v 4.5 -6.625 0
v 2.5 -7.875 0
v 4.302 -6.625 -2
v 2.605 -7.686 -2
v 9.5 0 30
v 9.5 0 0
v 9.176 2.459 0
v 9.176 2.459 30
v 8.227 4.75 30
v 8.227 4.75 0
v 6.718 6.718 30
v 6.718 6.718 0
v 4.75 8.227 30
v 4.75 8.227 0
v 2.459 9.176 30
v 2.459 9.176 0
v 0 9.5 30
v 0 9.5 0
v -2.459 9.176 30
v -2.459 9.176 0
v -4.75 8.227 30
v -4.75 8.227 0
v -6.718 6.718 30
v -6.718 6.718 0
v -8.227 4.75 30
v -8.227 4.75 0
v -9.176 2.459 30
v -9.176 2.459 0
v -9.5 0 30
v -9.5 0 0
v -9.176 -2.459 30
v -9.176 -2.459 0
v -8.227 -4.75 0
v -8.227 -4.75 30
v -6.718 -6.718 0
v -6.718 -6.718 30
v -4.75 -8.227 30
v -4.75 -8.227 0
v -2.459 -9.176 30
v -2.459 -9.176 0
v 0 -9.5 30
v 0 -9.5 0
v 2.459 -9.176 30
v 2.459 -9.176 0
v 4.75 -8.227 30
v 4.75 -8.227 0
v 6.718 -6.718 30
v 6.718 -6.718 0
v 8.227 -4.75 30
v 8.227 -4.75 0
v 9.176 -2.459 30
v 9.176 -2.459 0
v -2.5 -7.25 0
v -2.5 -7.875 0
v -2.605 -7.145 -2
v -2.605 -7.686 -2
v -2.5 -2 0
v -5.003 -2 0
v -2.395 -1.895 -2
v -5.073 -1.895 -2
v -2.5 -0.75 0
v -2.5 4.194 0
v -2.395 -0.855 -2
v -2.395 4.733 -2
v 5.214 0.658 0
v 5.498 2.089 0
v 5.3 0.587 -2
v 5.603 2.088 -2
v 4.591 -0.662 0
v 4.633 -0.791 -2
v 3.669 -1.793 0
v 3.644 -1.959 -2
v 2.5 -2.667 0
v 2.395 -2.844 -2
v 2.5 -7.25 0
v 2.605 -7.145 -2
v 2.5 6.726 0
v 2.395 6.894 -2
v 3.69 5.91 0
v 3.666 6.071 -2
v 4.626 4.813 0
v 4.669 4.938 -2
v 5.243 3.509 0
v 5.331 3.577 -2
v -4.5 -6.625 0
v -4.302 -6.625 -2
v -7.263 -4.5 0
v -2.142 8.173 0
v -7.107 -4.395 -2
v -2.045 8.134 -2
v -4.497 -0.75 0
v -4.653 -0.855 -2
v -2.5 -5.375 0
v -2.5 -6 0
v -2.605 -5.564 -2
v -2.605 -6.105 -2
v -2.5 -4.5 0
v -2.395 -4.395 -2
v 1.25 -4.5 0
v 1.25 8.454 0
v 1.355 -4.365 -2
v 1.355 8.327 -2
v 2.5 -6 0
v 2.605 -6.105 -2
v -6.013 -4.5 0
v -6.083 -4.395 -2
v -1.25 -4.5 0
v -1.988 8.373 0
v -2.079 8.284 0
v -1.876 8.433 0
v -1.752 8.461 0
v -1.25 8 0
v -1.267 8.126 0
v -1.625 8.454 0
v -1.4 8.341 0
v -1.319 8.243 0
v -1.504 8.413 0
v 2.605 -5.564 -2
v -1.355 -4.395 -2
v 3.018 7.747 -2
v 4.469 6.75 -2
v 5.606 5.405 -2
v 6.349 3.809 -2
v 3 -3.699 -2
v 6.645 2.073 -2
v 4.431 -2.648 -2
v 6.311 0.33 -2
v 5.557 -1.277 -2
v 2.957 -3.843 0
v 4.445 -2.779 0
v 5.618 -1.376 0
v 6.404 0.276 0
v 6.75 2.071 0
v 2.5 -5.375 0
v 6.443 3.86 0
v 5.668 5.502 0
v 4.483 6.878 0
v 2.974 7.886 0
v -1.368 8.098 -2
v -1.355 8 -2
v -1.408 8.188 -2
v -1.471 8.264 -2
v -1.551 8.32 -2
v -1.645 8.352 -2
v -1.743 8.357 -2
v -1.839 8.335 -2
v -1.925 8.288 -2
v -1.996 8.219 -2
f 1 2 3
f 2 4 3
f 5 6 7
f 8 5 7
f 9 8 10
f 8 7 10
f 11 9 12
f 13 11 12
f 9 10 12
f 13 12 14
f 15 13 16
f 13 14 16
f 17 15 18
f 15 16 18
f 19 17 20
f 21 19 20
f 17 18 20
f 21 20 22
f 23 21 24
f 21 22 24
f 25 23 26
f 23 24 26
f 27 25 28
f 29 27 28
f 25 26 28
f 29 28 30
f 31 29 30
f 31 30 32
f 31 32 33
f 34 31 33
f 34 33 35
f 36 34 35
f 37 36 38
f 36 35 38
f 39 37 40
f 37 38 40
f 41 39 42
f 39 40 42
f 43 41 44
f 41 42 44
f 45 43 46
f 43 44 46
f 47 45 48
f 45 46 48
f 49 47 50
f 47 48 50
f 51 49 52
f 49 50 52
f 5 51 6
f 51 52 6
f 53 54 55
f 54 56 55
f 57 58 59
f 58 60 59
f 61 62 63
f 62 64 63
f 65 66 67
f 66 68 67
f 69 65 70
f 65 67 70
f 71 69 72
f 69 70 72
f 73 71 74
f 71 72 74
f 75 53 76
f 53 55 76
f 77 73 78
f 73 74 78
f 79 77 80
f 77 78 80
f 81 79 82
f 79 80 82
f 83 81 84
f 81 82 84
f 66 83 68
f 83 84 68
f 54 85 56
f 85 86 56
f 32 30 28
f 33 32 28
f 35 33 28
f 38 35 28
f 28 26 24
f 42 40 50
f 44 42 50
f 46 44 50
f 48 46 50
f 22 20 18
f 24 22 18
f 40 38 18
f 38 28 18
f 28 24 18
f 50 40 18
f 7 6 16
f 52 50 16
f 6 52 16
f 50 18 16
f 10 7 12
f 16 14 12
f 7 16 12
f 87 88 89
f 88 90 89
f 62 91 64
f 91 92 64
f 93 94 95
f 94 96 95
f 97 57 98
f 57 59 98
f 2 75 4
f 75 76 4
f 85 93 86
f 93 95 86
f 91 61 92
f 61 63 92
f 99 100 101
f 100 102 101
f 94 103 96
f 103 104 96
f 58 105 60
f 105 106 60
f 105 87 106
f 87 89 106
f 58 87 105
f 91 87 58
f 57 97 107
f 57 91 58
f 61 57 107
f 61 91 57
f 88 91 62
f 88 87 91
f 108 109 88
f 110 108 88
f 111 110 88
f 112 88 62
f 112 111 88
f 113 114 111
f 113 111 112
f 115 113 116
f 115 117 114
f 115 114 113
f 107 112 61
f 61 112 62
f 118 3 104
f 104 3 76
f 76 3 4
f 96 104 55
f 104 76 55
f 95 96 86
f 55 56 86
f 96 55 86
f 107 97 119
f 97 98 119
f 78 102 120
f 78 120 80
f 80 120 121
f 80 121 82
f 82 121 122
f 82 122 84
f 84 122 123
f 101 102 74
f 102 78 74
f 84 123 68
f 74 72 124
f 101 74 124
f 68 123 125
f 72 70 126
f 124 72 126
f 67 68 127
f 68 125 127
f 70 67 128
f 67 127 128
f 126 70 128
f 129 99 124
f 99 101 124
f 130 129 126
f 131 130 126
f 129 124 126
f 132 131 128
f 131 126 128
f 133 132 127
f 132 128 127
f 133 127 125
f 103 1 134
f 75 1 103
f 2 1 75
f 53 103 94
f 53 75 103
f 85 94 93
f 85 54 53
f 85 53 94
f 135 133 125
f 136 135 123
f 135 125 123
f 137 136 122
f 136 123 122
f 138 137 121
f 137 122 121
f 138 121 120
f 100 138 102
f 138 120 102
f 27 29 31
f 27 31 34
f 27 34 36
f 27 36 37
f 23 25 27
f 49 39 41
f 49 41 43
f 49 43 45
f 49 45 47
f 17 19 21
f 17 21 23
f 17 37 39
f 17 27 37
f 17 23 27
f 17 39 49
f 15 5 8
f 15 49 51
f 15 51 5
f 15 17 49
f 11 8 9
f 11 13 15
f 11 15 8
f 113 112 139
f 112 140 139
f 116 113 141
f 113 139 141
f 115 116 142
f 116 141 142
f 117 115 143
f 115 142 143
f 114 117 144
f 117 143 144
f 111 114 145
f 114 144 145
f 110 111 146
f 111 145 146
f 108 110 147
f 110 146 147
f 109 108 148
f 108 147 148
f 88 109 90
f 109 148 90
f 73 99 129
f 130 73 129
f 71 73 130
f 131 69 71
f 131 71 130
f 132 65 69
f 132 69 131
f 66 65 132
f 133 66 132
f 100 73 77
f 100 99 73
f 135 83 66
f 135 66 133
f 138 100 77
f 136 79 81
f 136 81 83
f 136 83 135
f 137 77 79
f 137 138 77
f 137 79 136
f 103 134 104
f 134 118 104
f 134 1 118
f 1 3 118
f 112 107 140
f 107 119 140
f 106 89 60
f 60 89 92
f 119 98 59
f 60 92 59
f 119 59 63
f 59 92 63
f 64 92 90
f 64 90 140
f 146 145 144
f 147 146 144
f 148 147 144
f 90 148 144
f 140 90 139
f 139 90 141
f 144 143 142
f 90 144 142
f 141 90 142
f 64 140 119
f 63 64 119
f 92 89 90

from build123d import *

# Parameters (mm, degrees)
F1_DEPTH = 2
F1_TAPER = 3
F0_R     = 9.5
F2_DEPTH = 30


with BuildPart() as f1:
    # F0 (on Top) → F1 (new body)
    with BuildSketch(Plane.XY):
        with BuildLine():
            Line((-2.5, -4.5), (-1.25, -4.5))
            Line((-1.25, -4.5), (-1.25, 8))
            ThreePointArc((-1.25, 8), (-1.6246096615, 8.4544378581), (-2.1421771094, 8.1734216623))
            Line((-2.1421771094, 8.1734216623), (-7.2625718321, -4.5))
            Line((-7.2625718321, -4.5), (-6.0125718321, -4.5))
            Line((-6.0125718321, -4.5), (-5.0025062675, -2))
            Line((-5.0025062675, -2), (-2.5, -2))
            Line((-2.5, -2), (-2.5, -4.5))
        make_face()
        Polygon((-2.5, -0.75), (-4.4974734852, -0.75), (-2.5, 4.1939203632), align=None, mode=Mode.SUBTRACT)
    extrude(amount=-F1_DEPTH, taper=F1_TAPER)


with BuildPart() as f1b:
    # F0 (on Top) → F1, piece 2 (new body)
    with BuildSketch(Plane.XY):
        with BuildLine():
            Line((1.25, 8.4544378581), (1.25, -4.5))
            ThreePointArc((1.25, -4.5), (5.075982109, -2.1148576985), (6.75, 2.0713944437))
            ThreePointArc((6.75, 2.0713944437), (5.1224940234, 6.2301220319), (1.25, 8.4544378581))
        make_face()
        with BuildLine():
            ThreePointArc((2.5, 6.7258275142), (4.6257418552, 4.8128070407), (5.4982695285, 2.0893678132))
            ThreePointArc((5.4982695285, 2.0893678132), (4.5914102703, -0.6620430511), (2.5, -2.6667022589))
            Line((2.5, -2.6667022589), (2.5, 6.7258275142))
        make_face(mode=Mode.SUBTRACT)
    extrude(amount=-F1_DEPTH, taper=F1_TAPER)


with BuildPart() as f1c:
    # F0 (on Top) → F1, piece 3 (new body)
    with BuildSketch(Plane.XY):
        Polygon((2.5, -6), (-2.5, -6), (-2.5, -5.375), (-4.5, -6.625), (-2.5, -7.875), (-2.5, -7.25), (2.5, -7.25), (2.5, -7.875), (4.5, -6.625), (2.5, -5.375), align=None)
    extrude(amount=-F1_DEPTH, taper=F1_TAPER)


with BuildPart() as f2:
    # F0 (on Top) → F2 (new body)
    with BuildSketch(Plane.XY):
        Circle(F0_R)
        Polygon((-2.5, -5.375), (-2.5, -6), (2.5, -6), (2.5, -5.375), (4.5, -6.625), (2.5, -7.875), (2.5, -7.25), (-2.5, -7.25), (-2.5, -7.875), (-4.5, -6.625), align=None, mode=Mode.SUBTRACT)
        with BuildLine():
            Line((-1.25, 8), (-1.25, -4.5))
            Line((-1.25, -4.5), (-2.5, -4.5))
            Line((-2.5, -4.5), (-2.5, -2))
            Line((-2.5, -2), (-5.0025062675, -2))
            Line((-5.0025062675, -2), (-6.0125718321, -4.5))
            Line((-6.0125718321, -4.5), (-7.2625718321, -4.5))
            Line((-7.2625718321, -4.5), (-2.1421771094, 8.1734216623))
            ThreePointArc((-2.1421771094, 8.1734216623), (-1.6246096615, 8.4544378581), (-1.25, 8))
        make_face(mode=Mode.SUBTRACT)
        with BuildLine():
            ThreePointArc((6.75, 2.0713944437), (5.075982109, -2.1148576985), (1.25, -4.5))
            Line((1.25, -4.5), (1.25, 8.4544378581))
            ThreePointArc((1.25, 8.4544378581), (5.1224940234, 6.2301220319), (6.75, 2.0713944437))
        make_face(mode=Mode.SUBTRACT)
        with BuildLine():
            Line((1.25, 8.4544378581), (1.25, -4.5))
            ThreePointArc((1.25, -4.5), (5.075982109, -2.1148576985), (6.75, 2.0713944437))
            ThreePointArc((6.75, 2.0713944437), (5.1224940234, 6.2301220319), (1.25, 8.4544378581))
        make_face()
        with BuildLine():
            ThreePointArc((2.5, 6.7258275142), (4.6257418552, 4.8128070407), (5.4982695285, 2.0893678132))
            ThreePointArc((5.4982695285, 2.0893678132), (4.5914102703, -0.6620430511), (2.5, -2.6667022589))
            Line((2.5, -2.6667022589), (2.5, 6.7258275142))
        make_face(mode=Mode.SUBTRACT)
        with BuildLine():
            Line((-2.5, -4.5), (-1.25, -4.5))
            Line((-1.25, -4.5), (-1.25, 8))
            ThreePointArc((-1.25, 8), (-1.6246096615, 8.4544378581), (-2.1421771094, 8.1734216623))
            Line((-2.1421771094, 8.1734216623), (-7.2625718321, -4.5))
            Line((-7.2625718321, -4.5), (-6.0125718321, -4.5))
            Line((-6.0125718321, -4.5), (-5.0025062675, -2))
            Line((-5.0025062675, -2), (-2.5, -2))
            Line((-2.5, -2), (-2.5, -4.5))
        make_face()
        Polygon((-2.5, -0.75), (-4.4974734852, -0.75), (-2.5, 4.1939203632), align=None, mode=Mode.SUBTRACT)
        with BuildLine():
            ThreePointArc((2.5, -2.6667022589), (4.5914102703, -0.6620430511), (5.4982695285, 2.0893678132))
            ThreePointArc((5.4982695285, 2.0893678132), (4.6257418552, 4.8128070407), (2.5, 6.7258275142))
            Line((2.5, 6.7258275142), (2.5, -2.6667022589))
        make_face()
        Polygon((2.5, -6), (-2.5, -6), (-2.5, -5.375), (-4.5, -6.625), (-2.5, -7.875), (-2.5, -7.25), (2.5, -7.25), (2.5, -7.875), (4.5, -6.625), (2.5, -5.375), align=None)
        Polygon((-2.5, 4.1939203632), (-4.4974734852, -0.75), (-2.5, -0.75), align=None)
    extrude(amount=F2_DEPTH)


solid = Compound([f1.part, f1b.part, f1c.part, f2.part])
